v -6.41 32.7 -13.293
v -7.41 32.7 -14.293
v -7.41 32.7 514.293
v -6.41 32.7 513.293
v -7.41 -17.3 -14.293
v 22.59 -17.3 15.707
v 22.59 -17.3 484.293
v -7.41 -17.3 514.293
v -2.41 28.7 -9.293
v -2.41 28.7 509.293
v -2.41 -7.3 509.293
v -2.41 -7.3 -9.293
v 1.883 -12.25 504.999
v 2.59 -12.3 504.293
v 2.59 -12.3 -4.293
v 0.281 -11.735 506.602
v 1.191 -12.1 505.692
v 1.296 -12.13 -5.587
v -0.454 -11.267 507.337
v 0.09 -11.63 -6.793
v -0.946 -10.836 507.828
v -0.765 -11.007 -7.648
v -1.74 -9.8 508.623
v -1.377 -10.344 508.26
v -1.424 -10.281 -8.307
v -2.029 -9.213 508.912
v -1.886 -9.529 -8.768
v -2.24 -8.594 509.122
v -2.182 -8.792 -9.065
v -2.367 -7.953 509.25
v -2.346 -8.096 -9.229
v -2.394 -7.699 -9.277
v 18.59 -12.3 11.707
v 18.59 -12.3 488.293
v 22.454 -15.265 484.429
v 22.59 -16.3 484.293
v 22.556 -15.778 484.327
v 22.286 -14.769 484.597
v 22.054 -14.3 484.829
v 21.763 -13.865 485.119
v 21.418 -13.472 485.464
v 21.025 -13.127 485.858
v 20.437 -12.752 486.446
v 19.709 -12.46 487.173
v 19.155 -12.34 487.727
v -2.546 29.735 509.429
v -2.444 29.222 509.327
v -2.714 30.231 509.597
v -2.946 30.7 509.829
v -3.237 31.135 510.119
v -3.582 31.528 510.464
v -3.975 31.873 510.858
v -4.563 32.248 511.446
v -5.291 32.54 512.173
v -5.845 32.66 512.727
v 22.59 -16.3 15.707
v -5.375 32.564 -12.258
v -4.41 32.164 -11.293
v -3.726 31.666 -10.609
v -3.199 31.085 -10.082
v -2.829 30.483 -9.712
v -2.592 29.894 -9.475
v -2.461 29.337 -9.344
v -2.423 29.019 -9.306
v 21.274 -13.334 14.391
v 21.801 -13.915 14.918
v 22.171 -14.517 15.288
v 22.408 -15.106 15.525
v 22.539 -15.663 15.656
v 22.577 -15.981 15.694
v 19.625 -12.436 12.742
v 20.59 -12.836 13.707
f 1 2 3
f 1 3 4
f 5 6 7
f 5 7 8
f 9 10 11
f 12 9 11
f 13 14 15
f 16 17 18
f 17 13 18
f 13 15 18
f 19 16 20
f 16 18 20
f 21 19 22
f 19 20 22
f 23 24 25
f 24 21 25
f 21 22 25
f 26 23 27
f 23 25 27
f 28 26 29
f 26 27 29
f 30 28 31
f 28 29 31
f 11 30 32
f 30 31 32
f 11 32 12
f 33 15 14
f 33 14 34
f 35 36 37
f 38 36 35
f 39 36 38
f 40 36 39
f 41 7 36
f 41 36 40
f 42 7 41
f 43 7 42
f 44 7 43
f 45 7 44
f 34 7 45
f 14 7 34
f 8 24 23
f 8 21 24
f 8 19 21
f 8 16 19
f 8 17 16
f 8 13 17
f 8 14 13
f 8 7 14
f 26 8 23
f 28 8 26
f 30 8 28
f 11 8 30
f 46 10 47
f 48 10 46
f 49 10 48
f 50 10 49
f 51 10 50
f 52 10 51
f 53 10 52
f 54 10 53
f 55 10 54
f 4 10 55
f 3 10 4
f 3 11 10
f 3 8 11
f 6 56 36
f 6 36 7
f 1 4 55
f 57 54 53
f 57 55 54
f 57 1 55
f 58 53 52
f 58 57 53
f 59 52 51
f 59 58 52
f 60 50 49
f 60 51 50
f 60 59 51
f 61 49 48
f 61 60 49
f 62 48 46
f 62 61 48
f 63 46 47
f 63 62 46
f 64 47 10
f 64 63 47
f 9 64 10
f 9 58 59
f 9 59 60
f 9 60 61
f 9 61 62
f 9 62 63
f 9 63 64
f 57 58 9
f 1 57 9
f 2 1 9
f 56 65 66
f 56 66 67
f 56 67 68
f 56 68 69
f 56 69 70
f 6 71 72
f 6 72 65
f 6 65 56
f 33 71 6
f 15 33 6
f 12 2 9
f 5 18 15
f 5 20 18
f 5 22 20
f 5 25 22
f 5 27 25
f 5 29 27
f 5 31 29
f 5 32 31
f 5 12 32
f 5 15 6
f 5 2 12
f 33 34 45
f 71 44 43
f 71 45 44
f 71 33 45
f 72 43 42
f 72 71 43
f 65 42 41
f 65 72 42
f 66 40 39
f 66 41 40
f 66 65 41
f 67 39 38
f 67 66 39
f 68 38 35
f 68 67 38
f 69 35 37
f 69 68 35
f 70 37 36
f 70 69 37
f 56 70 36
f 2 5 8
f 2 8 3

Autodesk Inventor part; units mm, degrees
ref_plane "Start Plane" through (0, 0, -14.2929) normal (0, 0, 1) x (1, 0, 0)
ref_plane "End Plane" through (0, 0, 514.2929) normal (0, 0, 1) x (1, 0, 0)
sketch "Sketch" plane through (0, 0, 0) normal (0, 0, 1) x (1, 0, 0)
  line L0 (-2.41, 28.7) -> (-2.41, -7.3)
  line L1 (-7.41, 32.7) -> (-6.41, 32.7)
  line L2 (-7.41, -17.3) -> (-7.41, 32.7)
  line L3 (22.59, -17.3) -> (-7.41, -17.3)
  line L4 (22.59, -16.3) -> (22.59, -17.3)
  line L5 (2.59, -12.3) -> (18.59, -12.3)
  arc A0 (-2.41, -7.3) -> (2.59, -12.3) centre (2.59, -7.3) ccw
  arc A1 (-2.41, 28.7) -> (-6.41, 32.7) centre (-6.41, 28.7) ccw
  arc A2 (22.59, -16.3) -> (18.59, -12.3) centre (18.59, -16.3) ccw
  line L6 (0, 43.6941) -> (0, -27.4657) construction
  line L7 (-13.5757, 0) -> (29.5841, 0) construction
  point P0 (-2.41, 32.7)
  point P1 (-2.41, -12.3)
  point P2 (22.59, -12.3)
  dimension "d4" = 30
  dimension "d6" = 50
  dimension "d8" = 5
  dimension "d10" = 5
  dimension "d17" = 5
  dimension "d18" = 4
  dimension "d19" = 17.3
  dimension "d20" = 7.41
extrude "Body" add sketch "Sketch" along normal up to surface (528.5858 mm away) from surface at -14.2929
sketch "Sketch3" plane through (0, 0, 0) normal (0, 0, 1) x (1, 0, 0)
  line L0 (0, 0) -> (10, 0)
ref_plane "Work Plane10" through (0, 0, 0) normal (0, -1, 0) x (1, 0, 0)
sketch "Sketch4" plane through (0, 0, 0) normal (0, -1, 0) x (1, 0, 0)
  line L0 (-2, -14.2929) -> (12, -14.2929)
  line L1 (-2, 514.2929) -> (12, 514.2929)
  dimension "d24" = 528.5858
ref_plane "Work Plane11" through (-7.7636, 7.7, -14.6464) normal (0.7071, 0, -0.7071) x (-0.7071, 0, -0.7071)
split "Split1" plane through (-7.7636, 7.7, -14.6464) removes the side toward (0.7071, 0, -0.7071)
ref_plane "Work Plane12" through (-7.7636, 7.7, 514.6464) normal (0.7071, 0, 0.7071) x (0.7071, 0, -0.7071)
split "Split2" plane through (-7.7636, 7.7, 514.6464) removes the side toward (0.7071, 0, 0.7071)
equation "\"d4\" = b"
equation "\"d6\" = ParH"
equation "\"d8\" = ParT"
equation "\"d10\" = ParT"
equation "\"d17\" = R"
equation "\"d18\" = R1"
equation "\"d19\" = ex"
equation "\"d20\" = ey"
equation "\"d11\" = G_L"
equation "\"b\" = 30"
equation "\"ParT\" = 5"
equation "\"R1\" = 4"
equation "\"G_L\" = d24"
equation "\"ParH\" = 50"
equation "\"R\" = 5"
equation "\"ey\" = 7.41"
equation "\"ex\" = 17.3"
equation "\"G_OFFSET_START\" = 14.29289"
equation "\"G_OFFSET_END\" = 14.29289"
equation "\"d21\" = -G_OFFSET_START"
equation "\"d22\" = G_OFFSET_END + B_L"
equation "\"B_L\" = 500"
properties part number "ISO 657-2 - 50x 30x 5-528.59" material "Steel, Mild"
